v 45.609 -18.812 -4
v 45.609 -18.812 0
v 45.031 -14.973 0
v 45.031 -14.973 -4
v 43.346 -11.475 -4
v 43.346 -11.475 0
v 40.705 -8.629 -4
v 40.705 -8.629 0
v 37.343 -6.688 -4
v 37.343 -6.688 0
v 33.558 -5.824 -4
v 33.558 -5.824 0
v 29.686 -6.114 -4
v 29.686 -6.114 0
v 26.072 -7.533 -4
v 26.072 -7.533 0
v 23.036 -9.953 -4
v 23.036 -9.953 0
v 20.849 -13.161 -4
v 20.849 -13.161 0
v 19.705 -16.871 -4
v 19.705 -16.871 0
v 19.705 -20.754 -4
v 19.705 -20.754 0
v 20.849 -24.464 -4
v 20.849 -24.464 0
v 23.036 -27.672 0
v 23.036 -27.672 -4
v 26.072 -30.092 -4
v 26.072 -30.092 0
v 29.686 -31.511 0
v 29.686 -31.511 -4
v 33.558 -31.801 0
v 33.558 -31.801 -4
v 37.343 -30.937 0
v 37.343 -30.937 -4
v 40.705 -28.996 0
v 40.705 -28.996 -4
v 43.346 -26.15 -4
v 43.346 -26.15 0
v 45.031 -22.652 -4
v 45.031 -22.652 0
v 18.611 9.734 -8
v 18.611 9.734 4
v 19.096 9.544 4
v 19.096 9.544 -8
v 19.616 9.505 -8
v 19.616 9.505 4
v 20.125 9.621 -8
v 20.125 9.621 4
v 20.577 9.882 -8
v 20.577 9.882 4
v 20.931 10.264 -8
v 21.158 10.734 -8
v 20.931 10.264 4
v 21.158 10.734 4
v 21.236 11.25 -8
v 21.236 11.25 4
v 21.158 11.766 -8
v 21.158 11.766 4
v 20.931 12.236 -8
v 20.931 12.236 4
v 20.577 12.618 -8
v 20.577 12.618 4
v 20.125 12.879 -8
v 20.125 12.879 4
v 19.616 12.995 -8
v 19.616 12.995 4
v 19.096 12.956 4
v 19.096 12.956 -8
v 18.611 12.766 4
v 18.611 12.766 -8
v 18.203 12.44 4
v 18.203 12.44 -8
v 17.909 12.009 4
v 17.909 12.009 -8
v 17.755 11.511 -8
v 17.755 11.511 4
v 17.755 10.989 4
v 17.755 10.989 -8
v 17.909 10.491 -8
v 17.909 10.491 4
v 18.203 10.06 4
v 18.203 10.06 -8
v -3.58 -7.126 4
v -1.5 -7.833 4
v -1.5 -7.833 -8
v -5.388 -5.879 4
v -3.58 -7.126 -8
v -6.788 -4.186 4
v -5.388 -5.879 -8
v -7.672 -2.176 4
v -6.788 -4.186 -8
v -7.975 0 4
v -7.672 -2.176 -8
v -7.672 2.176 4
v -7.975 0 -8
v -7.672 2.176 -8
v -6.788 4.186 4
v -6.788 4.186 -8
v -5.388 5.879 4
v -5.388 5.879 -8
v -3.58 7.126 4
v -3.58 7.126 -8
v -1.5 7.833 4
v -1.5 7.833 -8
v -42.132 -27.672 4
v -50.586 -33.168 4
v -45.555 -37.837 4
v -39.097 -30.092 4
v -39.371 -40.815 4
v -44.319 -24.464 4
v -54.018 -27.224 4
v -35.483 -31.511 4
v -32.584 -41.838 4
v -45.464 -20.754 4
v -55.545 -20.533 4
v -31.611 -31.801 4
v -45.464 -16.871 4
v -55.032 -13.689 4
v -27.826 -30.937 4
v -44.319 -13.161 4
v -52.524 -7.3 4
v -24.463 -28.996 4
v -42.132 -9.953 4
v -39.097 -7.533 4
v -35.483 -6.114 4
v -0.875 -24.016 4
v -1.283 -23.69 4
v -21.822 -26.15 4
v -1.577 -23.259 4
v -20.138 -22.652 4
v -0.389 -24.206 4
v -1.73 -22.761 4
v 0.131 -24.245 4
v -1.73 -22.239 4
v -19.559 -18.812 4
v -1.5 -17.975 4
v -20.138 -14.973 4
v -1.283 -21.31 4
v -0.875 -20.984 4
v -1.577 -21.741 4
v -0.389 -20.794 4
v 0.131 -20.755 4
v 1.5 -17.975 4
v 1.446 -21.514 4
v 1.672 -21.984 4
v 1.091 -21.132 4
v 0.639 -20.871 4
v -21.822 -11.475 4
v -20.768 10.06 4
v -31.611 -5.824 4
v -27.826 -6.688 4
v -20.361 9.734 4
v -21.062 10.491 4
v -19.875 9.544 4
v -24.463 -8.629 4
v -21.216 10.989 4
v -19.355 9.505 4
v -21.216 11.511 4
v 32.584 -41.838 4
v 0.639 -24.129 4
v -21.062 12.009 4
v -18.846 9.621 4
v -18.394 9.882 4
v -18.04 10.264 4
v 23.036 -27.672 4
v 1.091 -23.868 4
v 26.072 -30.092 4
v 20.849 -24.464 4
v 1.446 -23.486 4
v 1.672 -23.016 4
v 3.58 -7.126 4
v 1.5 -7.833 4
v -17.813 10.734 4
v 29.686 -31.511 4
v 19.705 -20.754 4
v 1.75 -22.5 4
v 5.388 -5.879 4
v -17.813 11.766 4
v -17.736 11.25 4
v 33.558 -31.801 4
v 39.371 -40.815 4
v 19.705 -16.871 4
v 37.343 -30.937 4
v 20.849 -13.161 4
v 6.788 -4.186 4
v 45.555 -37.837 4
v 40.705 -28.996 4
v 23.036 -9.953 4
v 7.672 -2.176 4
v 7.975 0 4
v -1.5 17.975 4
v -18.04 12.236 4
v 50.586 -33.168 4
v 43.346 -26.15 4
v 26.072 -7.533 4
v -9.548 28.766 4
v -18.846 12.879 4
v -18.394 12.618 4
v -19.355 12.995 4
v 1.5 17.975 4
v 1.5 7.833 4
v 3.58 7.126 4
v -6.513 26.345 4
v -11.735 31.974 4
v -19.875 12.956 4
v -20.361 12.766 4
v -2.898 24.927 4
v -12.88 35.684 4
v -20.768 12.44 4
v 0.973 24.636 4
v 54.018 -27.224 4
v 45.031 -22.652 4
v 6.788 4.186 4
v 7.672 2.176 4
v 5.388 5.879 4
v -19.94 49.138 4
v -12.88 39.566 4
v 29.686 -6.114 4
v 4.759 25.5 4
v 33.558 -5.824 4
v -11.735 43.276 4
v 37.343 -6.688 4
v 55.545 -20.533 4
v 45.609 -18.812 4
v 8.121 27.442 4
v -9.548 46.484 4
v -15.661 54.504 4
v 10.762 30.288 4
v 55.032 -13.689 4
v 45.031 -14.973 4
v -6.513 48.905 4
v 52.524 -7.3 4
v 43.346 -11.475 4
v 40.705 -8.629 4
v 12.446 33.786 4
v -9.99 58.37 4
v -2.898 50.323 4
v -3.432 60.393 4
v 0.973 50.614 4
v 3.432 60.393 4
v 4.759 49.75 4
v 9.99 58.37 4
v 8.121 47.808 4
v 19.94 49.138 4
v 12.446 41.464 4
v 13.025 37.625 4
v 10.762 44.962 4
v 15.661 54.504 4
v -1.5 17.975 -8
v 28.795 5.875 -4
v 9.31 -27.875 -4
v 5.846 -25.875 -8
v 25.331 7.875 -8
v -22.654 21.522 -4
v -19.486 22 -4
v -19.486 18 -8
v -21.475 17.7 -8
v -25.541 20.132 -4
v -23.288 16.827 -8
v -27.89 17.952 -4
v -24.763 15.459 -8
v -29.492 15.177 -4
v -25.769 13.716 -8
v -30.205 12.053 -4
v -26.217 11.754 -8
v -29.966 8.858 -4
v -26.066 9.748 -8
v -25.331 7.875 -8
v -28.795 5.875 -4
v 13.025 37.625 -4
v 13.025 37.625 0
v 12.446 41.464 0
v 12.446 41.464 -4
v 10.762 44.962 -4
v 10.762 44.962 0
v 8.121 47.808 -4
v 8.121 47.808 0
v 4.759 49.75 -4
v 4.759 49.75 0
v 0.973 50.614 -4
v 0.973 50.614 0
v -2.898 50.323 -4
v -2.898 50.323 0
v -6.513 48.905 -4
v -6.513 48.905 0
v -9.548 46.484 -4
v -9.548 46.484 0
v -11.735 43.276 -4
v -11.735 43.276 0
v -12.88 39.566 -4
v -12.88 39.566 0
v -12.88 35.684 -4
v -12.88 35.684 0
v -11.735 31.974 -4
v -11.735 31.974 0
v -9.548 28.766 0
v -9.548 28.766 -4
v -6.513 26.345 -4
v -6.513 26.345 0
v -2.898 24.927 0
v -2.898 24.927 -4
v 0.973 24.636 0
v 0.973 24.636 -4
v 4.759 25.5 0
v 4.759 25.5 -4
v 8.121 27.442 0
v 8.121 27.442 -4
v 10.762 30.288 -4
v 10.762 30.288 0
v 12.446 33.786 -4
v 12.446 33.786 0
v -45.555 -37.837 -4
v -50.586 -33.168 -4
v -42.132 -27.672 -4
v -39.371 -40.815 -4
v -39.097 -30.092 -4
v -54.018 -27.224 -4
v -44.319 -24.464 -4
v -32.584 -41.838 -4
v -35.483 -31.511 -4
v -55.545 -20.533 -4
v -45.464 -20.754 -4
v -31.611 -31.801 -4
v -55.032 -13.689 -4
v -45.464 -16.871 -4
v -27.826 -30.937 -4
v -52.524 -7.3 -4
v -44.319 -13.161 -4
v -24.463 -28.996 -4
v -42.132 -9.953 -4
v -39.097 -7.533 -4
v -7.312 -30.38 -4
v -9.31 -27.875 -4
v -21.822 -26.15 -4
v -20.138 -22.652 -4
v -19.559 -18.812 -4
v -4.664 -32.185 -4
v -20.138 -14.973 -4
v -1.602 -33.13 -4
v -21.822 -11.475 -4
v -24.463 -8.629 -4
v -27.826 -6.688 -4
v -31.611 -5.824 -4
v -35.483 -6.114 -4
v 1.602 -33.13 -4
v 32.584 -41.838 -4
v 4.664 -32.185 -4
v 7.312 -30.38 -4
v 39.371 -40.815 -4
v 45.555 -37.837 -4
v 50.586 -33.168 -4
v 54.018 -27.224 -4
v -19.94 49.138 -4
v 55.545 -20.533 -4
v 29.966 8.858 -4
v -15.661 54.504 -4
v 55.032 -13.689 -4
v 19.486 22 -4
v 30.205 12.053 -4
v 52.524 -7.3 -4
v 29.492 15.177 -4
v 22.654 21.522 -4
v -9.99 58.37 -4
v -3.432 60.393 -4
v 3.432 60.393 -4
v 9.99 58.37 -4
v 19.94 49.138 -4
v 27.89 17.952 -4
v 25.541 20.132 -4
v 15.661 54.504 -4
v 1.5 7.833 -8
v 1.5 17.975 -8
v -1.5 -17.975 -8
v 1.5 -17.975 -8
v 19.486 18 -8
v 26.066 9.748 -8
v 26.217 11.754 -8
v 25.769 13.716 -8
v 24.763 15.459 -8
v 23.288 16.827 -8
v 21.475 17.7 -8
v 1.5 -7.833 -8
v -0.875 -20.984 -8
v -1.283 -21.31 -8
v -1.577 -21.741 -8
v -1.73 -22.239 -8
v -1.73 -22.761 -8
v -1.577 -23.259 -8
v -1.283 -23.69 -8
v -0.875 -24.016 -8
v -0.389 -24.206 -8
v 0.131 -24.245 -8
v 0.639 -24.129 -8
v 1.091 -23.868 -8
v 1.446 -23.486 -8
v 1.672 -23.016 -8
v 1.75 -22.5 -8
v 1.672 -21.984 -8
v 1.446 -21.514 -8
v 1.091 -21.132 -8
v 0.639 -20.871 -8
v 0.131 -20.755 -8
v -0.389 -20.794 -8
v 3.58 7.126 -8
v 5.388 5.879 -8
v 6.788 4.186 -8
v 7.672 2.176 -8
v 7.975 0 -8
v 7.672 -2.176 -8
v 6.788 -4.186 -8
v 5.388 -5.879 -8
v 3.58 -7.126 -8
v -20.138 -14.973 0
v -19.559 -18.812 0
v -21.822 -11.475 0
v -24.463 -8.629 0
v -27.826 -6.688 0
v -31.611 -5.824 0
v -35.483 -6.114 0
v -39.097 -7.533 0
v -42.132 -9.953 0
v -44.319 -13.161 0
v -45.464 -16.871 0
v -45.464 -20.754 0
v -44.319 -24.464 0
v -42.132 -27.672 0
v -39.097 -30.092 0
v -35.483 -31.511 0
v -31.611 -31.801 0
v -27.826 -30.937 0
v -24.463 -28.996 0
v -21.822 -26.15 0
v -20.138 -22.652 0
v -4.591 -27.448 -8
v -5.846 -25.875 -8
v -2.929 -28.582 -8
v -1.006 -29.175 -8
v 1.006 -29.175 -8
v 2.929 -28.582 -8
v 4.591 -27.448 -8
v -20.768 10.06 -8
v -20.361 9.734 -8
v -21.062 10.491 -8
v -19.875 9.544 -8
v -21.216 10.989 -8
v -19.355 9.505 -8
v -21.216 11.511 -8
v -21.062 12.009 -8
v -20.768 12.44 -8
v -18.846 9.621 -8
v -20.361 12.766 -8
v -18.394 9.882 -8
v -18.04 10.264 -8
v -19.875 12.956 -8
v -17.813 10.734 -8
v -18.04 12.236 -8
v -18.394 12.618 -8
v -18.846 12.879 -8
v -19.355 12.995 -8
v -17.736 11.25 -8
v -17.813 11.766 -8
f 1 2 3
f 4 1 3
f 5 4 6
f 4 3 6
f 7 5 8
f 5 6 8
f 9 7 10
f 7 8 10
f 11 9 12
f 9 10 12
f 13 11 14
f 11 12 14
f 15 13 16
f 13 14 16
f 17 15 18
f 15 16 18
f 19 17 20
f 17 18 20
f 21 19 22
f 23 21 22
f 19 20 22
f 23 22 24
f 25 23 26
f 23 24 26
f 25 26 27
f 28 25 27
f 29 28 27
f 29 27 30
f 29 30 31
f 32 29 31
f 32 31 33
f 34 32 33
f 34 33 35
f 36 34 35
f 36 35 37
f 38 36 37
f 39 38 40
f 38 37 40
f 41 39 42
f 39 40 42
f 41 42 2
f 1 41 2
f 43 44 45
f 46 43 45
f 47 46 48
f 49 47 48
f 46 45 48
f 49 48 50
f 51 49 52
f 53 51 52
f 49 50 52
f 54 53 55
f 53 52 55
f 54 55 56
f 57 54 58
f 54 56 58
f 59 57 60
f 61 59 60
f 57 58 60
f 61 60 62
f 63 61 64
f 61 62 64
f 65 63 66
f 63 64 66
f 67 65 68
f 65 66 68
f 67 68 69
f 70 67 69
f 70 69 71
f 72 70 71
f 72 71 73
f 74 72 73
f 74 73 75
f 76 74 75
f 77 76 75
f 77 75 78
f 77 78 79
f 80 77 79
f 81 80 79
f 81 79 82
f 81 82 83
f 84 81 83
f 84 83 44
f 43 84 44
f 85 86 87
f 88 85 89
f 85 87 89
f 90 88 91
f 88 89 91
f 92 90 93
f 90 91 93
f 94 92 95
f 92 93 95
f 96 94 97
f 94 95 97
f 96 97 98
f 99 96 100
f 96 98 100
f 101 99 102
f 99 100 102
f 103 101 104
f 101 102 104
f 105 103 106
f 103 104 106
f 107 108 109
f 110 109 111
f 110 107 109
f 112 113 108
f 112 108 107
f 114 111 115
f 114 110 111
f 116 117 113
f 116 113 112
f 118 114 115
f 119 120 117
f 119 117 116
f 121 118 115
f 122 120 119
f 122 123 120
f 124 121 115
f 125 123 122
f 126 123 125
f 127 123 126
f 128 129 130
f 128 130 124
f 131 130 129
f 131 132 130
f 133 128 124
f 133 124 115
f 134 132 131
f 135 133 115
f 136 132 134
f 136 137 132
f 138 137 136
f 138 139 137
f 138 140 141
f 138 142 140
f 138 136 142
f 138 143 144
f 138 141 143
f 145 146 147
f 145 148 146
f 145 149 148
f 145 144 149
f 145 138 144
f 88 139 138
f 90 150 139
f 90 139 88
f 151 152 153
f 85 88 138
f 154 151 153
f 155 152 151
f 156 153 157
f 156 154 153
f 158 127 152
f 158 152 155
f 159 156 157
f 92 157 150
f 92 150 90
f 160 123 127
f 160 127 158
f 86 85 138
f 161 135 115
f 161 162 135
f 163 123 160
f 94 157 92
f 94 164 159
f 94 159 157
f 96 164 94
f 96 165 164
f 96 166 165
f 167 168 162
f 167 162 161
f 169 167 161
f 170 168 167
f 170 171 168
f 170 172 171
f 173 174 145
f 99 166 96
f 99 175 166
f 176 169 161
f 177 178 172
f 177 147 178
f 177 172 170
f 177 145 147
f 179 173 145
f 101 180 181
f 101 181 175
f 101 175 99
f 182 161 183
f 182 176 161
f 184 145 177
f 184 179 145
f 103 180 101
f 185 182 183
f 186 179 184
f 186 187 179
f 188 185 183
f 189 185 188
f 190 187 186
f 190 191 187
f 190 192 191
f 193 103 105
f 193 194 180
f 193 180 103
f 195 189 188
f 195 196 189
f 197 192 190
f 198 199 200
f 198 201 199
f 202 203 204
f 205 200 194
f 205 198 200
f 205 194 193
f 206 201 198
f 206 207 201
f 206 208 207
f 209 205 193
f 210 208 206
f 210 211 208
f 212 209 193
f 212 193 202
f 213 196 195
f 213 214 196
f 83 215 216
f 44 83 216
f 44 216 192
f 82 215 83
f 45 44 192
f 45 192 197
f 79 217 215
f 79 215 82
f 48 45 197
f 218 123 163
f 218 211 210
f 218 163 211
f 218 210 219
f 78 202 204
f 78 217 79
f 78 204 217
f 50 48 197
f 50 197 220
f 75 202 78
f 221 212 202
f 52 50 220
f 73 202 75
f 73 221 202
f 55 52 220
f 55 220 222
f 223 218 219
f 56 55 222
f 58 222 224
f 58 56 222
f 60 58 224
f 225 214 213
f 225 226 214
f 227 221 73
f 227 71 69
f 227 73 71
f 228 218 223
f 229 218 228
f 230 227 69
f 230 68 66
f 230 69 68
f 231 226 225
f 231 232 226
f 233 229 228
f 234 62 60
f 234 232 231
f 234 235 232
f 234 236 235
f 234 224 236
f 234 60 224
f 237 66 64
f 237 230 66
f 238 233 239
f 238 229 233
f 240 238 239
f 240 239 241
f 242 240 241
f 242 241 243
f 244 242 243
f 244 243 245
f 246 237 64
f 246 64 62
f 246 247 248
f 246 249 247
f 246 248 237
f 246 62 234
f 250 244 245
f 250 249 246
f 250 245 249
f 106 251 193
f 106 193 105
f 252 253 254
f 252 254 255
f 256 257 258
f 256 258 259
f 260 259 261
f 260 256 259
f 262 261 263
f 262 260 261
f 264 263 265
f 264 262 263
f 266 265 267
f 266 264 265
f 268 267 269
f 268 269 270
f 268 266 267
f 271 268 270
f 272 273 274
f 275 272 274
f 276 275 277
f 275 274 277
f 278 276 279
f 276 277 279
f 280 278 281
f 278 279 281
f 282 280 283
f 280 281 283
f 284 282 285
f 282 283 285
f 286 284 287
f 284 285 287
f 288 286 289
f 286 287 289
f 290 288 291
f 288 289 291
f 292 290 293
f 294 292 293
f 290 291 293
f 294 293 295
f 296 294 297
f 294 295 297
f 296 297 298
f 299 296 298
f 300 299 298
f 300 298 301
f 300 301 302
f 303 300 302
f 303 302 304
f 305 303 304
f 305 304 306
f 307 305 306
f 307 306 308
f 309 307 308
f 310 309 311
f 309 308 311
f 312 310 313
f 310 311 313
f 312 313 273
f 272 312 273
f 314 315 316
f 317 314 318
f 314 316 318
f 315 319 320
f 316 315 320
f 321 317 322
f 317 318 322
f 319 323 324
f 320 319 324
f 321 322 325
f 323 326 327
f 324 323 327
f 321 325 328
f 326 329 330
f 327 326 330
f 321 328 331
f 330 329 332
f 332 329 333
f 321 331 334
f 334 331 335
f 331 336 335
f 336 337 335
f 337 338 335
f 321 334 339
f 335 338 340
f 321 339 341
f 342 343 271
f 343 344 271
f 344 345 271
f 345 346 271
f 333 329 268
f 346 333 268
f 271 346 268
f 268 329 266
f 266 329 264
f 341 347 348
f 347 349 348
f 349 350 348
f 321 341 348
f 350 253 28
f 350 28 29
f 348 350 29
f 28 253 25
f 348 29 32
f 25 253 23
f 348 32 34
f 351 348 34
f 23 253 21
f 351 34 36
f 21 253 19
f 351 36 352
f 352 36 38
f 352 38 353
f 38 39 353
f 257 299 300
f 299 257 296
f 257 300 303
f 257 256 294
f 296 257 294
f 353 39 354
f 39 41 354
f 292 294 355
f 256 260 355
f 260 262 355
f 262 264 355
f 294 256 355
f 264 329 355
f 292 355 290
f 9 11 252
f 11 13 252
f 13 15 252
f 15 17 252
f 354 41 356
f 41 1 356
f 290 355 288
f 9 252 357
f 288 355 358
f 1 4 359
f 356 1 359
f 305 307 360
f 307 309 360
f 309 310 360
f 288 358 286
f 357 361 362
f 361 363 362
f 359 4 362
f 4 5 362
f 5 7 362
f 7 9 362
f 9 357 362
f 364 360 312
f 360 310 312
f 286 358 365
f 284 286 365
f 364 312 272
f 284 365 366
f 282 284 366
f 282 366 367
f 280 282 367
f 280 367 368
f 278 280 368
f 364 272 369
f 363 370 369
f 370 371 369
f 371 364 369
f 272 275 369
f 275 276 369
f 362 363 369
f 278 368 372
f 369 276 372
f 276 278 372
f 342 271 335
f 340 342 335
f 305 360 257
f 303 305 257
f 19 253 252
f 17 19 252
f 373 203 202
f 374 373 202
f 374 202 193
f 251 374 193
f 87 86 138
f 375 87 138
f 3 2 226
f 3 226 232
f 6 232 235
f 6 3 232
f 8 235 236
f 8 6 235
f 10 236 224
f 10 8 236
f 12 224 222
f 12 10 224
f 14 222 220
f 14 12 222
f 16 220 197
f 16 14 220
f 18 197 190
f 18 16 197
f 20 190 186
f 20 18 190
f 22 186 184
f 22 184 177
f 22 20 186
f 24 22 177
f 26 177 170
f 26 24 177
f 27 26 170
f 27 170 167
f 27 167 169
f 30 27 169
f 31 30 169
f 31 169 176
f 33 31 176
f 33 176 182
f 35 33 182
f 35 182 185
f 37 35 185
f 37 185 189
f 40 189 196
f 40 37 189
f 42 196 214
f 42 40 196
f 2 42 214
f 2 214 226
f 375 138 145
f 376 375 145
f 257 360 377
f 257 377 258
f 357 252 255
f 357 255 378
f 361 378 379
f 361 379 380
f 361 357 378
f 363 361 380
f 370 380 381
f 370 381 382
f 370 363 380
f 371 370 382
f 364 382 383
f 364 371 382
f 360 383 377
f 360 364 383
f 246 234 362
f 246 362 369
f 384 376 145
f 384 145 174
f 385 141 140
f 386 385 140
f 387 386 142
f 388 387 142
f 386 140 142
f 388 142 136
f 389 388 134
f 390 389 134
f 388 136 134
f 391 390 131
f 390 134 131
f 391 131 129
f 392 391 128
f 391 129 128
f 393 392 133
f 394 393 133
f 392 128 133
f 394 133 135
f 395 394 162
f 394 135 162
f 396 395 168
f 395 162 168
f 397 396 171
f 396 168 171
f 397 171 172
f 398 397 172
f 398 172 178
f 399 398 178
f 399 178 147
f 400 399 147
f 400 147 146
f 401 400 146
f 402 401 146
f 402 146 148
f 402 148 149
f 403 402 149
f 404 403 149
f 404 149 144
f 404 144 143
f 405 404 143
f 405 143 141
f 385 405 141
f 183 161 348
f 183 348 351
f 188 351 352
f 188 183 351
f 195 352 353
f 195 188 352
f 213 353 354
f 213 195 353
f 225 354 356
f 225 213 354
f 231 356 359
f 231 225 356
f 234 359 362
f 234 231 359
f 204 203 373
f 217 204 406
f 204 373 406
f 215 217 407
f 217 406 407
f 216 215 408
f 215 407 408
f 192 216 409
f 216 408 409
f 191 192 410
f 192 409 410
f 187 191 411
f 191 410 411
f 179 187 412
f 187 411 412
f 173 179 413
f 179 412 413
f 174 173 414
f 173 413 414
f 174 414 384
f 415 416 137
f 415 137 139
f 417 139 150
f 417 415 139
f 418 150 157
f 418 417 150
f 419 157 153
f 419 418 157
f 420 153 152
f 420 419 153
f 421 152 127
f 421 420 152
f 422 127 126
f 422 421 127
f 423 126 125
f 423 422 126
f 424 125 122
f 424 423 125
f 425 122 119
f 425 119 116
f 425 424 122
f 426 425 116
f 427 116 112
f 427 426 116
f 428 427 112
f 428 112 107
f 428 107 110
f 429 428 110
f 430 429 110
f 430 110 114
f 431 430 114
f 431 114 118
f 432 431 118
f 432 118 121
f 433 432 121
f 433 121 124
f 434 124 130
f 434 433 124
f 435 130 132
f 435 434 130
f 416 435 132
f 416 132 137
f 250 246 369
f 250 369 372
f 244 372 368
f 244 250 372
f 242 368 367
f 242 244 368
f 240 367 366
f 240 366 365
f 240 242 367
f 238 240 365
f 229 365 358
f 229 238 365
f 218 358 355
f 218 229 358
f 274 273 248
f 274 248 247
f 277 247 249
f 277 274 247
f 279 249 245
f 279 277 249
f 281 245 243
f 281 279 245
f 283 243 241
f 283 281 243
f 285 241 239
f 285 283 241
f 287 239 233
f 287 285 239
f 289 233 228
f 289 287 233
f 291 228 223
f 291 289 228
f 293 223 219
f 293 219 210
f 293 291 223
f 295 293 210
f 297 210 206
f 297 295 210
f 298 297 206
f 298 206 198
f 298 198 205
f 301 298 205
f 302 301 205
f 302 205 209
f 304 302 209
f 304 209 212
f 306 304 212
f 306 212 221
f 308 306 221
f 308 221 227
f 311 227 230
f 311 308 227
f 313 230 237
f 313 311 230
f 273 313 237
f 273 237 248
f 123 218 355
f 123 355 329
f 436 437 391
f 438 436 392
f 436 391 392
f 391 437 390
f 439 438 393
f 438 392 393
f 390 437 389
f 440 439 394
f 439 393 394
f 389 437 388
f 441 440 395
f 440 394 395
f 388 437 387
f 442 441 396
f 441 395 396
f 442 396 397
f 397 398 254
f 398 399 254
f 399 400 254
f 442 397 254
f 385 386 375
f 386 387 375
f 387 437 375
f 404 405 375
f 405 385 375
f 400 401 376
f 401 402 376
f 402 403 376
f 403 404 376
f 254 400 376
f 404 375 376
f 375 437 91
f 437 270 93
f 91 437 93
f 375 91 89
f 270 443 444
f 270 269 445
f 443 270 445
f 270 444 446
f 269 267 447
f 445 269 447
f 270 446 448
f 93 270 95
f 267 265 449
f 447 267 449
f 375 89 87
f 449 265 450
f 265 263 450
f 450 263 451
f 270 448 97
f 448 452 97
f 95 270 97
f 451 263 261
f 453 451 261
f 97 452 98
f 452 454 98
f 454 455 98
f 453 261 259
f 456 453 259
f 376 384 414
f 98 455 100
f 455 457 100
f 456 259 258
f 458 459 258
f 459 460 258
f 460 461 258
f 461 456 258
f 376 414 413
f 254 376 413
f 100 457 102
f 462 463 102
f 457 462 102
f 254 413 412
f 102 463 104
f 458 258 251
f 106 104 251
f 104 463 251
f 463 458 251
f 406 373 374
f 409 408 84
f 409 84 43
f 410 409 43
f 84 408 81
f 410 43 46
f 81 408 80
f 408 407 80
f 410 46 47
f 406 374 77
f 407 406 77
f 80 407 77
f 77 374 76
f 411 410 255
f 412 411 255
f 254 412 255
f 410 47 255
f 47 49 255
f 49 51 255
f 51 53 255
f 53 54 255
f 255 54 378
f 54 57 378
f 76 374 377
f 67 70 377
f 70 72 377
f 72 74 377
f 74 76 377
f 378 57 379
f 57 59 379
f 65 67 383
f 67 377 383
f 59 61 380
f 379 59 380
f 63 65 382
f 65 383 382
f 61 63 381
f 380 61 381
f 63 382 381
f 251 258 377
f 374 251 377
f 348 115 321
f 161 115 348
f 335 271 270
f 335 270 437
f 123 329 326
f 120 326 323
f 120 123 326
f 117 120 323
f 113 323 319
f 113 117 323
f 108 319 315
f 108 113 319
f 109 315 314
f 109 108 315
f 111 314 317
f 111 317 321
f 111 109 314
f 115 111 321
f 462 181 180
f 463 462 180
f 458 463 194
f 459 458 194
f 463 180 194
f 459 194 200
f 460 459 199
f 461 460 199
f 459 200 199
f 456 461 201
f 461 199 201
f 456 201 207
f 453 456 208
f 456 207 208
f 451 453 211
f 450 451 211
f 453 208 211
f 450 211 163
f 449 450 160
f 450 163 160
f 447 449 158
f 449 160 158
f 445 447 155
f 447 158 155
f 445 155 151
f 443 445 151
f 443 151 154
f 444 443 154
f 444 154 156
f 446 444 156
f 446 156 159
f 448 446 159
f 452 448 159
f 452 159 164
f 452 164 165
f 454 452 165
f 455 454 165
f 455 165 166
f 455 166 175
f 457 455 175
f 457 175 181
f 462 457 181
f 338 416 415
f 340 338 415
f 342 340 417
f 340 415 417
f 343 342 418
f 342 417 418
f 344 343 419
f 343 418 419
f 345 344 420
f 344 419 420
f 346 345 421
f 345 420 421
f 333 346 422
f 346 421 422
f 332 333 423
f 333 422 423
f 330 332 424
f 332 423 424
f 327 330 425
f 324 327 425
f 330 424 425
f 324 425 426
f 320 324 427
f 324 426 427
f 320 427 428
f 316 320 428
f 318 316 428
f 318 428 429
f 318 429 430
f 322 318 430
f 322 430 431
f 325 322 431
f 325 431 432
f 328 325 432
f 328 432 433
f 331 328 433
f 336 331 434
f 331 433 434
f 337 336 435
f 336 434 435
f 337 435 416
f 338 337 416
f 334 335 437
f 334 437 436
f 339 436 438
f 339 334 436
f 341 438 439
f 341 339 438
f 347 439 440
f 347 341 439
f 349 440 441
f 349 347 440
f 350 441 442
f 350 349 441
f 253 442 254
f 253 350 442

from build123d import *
from build123d.topology import SkipClean

# Parameters (mm, degrees)
SKETCH1_R           = 23.025
SKETCH1_R_2         = 13.025
SKETCH1_R_3         = 7.975
BOSS_EXTRUDE1_DEPTH = 4
BOSS_EXTRUDE3_START = 4
SKETCH5_R           = 7.975
BOSS_EXTRUDE3_DEPTH = 4
CHAMFER2_SIZE       = 4
CUT_EXTRUDE1_DEPTH  = 84.155314152
SKETCH3_R           = 1.75
CUT_EXTRUDE2_DEPTH  = 84.155314152
CIRPATTERN2_COUNT   = 3
CIRPATTERN3_COUNT   = 2


with BuildPart() as part:
    # Sketch1 → Boss-Extrude1 (new, symmetric)
    # profile 1 of 4: a face of its own
    with BuildSketch(Plane.XY):
        with Locations((0, 37.625)):
            Circle(SKETCH1_R)
        with Locations((0, 37.625)):
            Circle(SKETCH1_R_2, mode=Mode.SUBTRACT)
    # profile 2 of 4: a face of its own
    with BuildSketch(Plane.XY):
        with BuildLine():
            ThreePointArc((23.025, 37.625), (-5.959308513, 15.38455785), (-19.940234922, 49.1375))
            Line((-19.940234922, 49.1375), (-52.52444074, -7.3))
            ThreePointArc((-52.52444074, -7.3), (-26.624897304, 3.42794215), (-9.559205817, -18.8125))
            ThreePointArc((-9.559205817, -18.8125), (-16.303072181, -35.093633637), (-32.584205817, -41.8375))
            Line((-32.584205817, -41.8375), (32.584205817, -41.8375))
            ThreePointArc((32.584205817, -41.8375), (12.643970895, -7.3), (52.52444074, -7.3))
            Line((52.52444074, -7.3), (19.940234922, 49.1375))
            ThreePointArc((19.940234922, 49.1375), (22.24044215, 43.584308513), (23.025, 37.625))
        make_face()
        Circle(SKETCH1_R_3, mode=Mode.SUBTRACT)
    # profile 3 of 4: a face of its own
    with BuildSketch(Plane.XY):
        with Locations((-32.584205817, -18.8125)):
            Circle(SKETCH1_R)
        with Locations((-32.584205817, -18.8125)):
            Circle(SKETCH1_R_2, mode=Mode.SUBTRACT)
    # profile 4 of 4: a face of its own
    with BuildSketch(Plane.XY):
        with Locations((32.584205817, -18.8125)):
            Circle(SKETCH1_R)
        with Locations((32.584205817, -18.8125)):
            Circle(SKETCH1_R_2, mode=Mode.SUBTRACT)
    extrude(amount=BOSS_EXTRUDE1_DEPTH, both=True)

    # Sketch5 → Boss-Extrude3 (add)
    with SkipClean():  # the faces are left unmerged after this step: merging them gives an invalid solid
        with BuildSketch(Plane(origin=(0, 0, -4), x_dir=(-1, 0, 0), z_dir=(0, 0, -1)).offset(BOSS_EXTRUDE3_START)):
            with BuildLine():
                Line((-5.845671476, -25.875), (-25.331243061, 7.875))
                ThreePointArc((-25.331243061, 7.875), (-25.331243061, 14.625), (-19.485571585, 18))
                Line((-19.485571585, 18), (19.485571585, 18))
                ThreePointArc((19.485571585, 18), (25.331243061, 14.625), (25.331243061, 7.875))
                Line((25.331243061, 7.875), (5.845671476, -25.875))
                ThreePointArc((5.845671476, -25.875), (0, -29.25), (-5.845671476, -25.875))
            make_face()
            Circle(SKETCH5_R, mode=Mode.SUBTRACT)
        extrude(amount=-BOSS_EXTRUDE3_DEPTH)

    # Chamfer2
    chamfer2_edges = [part.edges().sort_by_distance(p)[0] for p in [
        (0, -29.25, -4),
        (-15.588457268, -9, -4),
        (15.588457268, -9, -4),
        (-25.331243061, 14.625, -4),
        (25.331243061, 14.625, -4),
        (0, 18, -4),
    ]]
    chamfer(chamfer2_edges, length=CHAMFER2_SIZE - 0.0001)  # a hair under: the kernel refuses the full size

    # Sketch2 → Cut-Extrude1 (cut, through all)
    with BuildSketch(Plane.XY.offset(4)):
        with BuildLine():
            Line((-1.5, 17.975), (-1.5, 7.832663978))
            ThreePointArc((-1.5, 7.832663978), (0, 7.975), (1.5, 7.832663978))
            Line((1.5, 7.832663978), (1.5, 17.975))
            Line((1.5, 17.975), (-1.5, 17.975))
        make_face()
    cut_extrude1 = extrude(amount=-CUT_EXTRUDE1_DEPTH, mode=Mode.SUBTRACT)

    # Sketch3 → Cut-Extrude2 (cut, through all)
    with BuildSketch(Plane.XY.offset(4)):
        with Locations((-19.485571585, 11.25)):
            Circle(SKETCH3_R)
    cut_extrude2 = extrude(amount=-CUT_EXTRUDE2_DEPTH, mode=Mode.SUBTRACT)

    # CirPattern2: Cut-Extrude2 ×3 about axis
    cirpattern2_axis = Axis((0, 0, 0), (0, 0, 1))
    for i in range(1, CIRPATTERN2_COUNT):
        add(cut_extrude2.rotate(cirpattern2_axis, i * 360 / CIRPATTERN2_COUNT), mode=Mode.SUBTRACT)

    # CirPattern3: Cut-Extrude1 ×2 about axis
    cirpattern3_axis = Axis((0, 0, 0), (0, 0, 1))
    for i in range(1, CIRPATTERN3_COUNT):
        add(cut_extrude1.rotate(cirpattern3_axis, i * 360 / CIRPATTERN3_COUNT), mode=Mode.SUBTRACT)


solid = part.part
